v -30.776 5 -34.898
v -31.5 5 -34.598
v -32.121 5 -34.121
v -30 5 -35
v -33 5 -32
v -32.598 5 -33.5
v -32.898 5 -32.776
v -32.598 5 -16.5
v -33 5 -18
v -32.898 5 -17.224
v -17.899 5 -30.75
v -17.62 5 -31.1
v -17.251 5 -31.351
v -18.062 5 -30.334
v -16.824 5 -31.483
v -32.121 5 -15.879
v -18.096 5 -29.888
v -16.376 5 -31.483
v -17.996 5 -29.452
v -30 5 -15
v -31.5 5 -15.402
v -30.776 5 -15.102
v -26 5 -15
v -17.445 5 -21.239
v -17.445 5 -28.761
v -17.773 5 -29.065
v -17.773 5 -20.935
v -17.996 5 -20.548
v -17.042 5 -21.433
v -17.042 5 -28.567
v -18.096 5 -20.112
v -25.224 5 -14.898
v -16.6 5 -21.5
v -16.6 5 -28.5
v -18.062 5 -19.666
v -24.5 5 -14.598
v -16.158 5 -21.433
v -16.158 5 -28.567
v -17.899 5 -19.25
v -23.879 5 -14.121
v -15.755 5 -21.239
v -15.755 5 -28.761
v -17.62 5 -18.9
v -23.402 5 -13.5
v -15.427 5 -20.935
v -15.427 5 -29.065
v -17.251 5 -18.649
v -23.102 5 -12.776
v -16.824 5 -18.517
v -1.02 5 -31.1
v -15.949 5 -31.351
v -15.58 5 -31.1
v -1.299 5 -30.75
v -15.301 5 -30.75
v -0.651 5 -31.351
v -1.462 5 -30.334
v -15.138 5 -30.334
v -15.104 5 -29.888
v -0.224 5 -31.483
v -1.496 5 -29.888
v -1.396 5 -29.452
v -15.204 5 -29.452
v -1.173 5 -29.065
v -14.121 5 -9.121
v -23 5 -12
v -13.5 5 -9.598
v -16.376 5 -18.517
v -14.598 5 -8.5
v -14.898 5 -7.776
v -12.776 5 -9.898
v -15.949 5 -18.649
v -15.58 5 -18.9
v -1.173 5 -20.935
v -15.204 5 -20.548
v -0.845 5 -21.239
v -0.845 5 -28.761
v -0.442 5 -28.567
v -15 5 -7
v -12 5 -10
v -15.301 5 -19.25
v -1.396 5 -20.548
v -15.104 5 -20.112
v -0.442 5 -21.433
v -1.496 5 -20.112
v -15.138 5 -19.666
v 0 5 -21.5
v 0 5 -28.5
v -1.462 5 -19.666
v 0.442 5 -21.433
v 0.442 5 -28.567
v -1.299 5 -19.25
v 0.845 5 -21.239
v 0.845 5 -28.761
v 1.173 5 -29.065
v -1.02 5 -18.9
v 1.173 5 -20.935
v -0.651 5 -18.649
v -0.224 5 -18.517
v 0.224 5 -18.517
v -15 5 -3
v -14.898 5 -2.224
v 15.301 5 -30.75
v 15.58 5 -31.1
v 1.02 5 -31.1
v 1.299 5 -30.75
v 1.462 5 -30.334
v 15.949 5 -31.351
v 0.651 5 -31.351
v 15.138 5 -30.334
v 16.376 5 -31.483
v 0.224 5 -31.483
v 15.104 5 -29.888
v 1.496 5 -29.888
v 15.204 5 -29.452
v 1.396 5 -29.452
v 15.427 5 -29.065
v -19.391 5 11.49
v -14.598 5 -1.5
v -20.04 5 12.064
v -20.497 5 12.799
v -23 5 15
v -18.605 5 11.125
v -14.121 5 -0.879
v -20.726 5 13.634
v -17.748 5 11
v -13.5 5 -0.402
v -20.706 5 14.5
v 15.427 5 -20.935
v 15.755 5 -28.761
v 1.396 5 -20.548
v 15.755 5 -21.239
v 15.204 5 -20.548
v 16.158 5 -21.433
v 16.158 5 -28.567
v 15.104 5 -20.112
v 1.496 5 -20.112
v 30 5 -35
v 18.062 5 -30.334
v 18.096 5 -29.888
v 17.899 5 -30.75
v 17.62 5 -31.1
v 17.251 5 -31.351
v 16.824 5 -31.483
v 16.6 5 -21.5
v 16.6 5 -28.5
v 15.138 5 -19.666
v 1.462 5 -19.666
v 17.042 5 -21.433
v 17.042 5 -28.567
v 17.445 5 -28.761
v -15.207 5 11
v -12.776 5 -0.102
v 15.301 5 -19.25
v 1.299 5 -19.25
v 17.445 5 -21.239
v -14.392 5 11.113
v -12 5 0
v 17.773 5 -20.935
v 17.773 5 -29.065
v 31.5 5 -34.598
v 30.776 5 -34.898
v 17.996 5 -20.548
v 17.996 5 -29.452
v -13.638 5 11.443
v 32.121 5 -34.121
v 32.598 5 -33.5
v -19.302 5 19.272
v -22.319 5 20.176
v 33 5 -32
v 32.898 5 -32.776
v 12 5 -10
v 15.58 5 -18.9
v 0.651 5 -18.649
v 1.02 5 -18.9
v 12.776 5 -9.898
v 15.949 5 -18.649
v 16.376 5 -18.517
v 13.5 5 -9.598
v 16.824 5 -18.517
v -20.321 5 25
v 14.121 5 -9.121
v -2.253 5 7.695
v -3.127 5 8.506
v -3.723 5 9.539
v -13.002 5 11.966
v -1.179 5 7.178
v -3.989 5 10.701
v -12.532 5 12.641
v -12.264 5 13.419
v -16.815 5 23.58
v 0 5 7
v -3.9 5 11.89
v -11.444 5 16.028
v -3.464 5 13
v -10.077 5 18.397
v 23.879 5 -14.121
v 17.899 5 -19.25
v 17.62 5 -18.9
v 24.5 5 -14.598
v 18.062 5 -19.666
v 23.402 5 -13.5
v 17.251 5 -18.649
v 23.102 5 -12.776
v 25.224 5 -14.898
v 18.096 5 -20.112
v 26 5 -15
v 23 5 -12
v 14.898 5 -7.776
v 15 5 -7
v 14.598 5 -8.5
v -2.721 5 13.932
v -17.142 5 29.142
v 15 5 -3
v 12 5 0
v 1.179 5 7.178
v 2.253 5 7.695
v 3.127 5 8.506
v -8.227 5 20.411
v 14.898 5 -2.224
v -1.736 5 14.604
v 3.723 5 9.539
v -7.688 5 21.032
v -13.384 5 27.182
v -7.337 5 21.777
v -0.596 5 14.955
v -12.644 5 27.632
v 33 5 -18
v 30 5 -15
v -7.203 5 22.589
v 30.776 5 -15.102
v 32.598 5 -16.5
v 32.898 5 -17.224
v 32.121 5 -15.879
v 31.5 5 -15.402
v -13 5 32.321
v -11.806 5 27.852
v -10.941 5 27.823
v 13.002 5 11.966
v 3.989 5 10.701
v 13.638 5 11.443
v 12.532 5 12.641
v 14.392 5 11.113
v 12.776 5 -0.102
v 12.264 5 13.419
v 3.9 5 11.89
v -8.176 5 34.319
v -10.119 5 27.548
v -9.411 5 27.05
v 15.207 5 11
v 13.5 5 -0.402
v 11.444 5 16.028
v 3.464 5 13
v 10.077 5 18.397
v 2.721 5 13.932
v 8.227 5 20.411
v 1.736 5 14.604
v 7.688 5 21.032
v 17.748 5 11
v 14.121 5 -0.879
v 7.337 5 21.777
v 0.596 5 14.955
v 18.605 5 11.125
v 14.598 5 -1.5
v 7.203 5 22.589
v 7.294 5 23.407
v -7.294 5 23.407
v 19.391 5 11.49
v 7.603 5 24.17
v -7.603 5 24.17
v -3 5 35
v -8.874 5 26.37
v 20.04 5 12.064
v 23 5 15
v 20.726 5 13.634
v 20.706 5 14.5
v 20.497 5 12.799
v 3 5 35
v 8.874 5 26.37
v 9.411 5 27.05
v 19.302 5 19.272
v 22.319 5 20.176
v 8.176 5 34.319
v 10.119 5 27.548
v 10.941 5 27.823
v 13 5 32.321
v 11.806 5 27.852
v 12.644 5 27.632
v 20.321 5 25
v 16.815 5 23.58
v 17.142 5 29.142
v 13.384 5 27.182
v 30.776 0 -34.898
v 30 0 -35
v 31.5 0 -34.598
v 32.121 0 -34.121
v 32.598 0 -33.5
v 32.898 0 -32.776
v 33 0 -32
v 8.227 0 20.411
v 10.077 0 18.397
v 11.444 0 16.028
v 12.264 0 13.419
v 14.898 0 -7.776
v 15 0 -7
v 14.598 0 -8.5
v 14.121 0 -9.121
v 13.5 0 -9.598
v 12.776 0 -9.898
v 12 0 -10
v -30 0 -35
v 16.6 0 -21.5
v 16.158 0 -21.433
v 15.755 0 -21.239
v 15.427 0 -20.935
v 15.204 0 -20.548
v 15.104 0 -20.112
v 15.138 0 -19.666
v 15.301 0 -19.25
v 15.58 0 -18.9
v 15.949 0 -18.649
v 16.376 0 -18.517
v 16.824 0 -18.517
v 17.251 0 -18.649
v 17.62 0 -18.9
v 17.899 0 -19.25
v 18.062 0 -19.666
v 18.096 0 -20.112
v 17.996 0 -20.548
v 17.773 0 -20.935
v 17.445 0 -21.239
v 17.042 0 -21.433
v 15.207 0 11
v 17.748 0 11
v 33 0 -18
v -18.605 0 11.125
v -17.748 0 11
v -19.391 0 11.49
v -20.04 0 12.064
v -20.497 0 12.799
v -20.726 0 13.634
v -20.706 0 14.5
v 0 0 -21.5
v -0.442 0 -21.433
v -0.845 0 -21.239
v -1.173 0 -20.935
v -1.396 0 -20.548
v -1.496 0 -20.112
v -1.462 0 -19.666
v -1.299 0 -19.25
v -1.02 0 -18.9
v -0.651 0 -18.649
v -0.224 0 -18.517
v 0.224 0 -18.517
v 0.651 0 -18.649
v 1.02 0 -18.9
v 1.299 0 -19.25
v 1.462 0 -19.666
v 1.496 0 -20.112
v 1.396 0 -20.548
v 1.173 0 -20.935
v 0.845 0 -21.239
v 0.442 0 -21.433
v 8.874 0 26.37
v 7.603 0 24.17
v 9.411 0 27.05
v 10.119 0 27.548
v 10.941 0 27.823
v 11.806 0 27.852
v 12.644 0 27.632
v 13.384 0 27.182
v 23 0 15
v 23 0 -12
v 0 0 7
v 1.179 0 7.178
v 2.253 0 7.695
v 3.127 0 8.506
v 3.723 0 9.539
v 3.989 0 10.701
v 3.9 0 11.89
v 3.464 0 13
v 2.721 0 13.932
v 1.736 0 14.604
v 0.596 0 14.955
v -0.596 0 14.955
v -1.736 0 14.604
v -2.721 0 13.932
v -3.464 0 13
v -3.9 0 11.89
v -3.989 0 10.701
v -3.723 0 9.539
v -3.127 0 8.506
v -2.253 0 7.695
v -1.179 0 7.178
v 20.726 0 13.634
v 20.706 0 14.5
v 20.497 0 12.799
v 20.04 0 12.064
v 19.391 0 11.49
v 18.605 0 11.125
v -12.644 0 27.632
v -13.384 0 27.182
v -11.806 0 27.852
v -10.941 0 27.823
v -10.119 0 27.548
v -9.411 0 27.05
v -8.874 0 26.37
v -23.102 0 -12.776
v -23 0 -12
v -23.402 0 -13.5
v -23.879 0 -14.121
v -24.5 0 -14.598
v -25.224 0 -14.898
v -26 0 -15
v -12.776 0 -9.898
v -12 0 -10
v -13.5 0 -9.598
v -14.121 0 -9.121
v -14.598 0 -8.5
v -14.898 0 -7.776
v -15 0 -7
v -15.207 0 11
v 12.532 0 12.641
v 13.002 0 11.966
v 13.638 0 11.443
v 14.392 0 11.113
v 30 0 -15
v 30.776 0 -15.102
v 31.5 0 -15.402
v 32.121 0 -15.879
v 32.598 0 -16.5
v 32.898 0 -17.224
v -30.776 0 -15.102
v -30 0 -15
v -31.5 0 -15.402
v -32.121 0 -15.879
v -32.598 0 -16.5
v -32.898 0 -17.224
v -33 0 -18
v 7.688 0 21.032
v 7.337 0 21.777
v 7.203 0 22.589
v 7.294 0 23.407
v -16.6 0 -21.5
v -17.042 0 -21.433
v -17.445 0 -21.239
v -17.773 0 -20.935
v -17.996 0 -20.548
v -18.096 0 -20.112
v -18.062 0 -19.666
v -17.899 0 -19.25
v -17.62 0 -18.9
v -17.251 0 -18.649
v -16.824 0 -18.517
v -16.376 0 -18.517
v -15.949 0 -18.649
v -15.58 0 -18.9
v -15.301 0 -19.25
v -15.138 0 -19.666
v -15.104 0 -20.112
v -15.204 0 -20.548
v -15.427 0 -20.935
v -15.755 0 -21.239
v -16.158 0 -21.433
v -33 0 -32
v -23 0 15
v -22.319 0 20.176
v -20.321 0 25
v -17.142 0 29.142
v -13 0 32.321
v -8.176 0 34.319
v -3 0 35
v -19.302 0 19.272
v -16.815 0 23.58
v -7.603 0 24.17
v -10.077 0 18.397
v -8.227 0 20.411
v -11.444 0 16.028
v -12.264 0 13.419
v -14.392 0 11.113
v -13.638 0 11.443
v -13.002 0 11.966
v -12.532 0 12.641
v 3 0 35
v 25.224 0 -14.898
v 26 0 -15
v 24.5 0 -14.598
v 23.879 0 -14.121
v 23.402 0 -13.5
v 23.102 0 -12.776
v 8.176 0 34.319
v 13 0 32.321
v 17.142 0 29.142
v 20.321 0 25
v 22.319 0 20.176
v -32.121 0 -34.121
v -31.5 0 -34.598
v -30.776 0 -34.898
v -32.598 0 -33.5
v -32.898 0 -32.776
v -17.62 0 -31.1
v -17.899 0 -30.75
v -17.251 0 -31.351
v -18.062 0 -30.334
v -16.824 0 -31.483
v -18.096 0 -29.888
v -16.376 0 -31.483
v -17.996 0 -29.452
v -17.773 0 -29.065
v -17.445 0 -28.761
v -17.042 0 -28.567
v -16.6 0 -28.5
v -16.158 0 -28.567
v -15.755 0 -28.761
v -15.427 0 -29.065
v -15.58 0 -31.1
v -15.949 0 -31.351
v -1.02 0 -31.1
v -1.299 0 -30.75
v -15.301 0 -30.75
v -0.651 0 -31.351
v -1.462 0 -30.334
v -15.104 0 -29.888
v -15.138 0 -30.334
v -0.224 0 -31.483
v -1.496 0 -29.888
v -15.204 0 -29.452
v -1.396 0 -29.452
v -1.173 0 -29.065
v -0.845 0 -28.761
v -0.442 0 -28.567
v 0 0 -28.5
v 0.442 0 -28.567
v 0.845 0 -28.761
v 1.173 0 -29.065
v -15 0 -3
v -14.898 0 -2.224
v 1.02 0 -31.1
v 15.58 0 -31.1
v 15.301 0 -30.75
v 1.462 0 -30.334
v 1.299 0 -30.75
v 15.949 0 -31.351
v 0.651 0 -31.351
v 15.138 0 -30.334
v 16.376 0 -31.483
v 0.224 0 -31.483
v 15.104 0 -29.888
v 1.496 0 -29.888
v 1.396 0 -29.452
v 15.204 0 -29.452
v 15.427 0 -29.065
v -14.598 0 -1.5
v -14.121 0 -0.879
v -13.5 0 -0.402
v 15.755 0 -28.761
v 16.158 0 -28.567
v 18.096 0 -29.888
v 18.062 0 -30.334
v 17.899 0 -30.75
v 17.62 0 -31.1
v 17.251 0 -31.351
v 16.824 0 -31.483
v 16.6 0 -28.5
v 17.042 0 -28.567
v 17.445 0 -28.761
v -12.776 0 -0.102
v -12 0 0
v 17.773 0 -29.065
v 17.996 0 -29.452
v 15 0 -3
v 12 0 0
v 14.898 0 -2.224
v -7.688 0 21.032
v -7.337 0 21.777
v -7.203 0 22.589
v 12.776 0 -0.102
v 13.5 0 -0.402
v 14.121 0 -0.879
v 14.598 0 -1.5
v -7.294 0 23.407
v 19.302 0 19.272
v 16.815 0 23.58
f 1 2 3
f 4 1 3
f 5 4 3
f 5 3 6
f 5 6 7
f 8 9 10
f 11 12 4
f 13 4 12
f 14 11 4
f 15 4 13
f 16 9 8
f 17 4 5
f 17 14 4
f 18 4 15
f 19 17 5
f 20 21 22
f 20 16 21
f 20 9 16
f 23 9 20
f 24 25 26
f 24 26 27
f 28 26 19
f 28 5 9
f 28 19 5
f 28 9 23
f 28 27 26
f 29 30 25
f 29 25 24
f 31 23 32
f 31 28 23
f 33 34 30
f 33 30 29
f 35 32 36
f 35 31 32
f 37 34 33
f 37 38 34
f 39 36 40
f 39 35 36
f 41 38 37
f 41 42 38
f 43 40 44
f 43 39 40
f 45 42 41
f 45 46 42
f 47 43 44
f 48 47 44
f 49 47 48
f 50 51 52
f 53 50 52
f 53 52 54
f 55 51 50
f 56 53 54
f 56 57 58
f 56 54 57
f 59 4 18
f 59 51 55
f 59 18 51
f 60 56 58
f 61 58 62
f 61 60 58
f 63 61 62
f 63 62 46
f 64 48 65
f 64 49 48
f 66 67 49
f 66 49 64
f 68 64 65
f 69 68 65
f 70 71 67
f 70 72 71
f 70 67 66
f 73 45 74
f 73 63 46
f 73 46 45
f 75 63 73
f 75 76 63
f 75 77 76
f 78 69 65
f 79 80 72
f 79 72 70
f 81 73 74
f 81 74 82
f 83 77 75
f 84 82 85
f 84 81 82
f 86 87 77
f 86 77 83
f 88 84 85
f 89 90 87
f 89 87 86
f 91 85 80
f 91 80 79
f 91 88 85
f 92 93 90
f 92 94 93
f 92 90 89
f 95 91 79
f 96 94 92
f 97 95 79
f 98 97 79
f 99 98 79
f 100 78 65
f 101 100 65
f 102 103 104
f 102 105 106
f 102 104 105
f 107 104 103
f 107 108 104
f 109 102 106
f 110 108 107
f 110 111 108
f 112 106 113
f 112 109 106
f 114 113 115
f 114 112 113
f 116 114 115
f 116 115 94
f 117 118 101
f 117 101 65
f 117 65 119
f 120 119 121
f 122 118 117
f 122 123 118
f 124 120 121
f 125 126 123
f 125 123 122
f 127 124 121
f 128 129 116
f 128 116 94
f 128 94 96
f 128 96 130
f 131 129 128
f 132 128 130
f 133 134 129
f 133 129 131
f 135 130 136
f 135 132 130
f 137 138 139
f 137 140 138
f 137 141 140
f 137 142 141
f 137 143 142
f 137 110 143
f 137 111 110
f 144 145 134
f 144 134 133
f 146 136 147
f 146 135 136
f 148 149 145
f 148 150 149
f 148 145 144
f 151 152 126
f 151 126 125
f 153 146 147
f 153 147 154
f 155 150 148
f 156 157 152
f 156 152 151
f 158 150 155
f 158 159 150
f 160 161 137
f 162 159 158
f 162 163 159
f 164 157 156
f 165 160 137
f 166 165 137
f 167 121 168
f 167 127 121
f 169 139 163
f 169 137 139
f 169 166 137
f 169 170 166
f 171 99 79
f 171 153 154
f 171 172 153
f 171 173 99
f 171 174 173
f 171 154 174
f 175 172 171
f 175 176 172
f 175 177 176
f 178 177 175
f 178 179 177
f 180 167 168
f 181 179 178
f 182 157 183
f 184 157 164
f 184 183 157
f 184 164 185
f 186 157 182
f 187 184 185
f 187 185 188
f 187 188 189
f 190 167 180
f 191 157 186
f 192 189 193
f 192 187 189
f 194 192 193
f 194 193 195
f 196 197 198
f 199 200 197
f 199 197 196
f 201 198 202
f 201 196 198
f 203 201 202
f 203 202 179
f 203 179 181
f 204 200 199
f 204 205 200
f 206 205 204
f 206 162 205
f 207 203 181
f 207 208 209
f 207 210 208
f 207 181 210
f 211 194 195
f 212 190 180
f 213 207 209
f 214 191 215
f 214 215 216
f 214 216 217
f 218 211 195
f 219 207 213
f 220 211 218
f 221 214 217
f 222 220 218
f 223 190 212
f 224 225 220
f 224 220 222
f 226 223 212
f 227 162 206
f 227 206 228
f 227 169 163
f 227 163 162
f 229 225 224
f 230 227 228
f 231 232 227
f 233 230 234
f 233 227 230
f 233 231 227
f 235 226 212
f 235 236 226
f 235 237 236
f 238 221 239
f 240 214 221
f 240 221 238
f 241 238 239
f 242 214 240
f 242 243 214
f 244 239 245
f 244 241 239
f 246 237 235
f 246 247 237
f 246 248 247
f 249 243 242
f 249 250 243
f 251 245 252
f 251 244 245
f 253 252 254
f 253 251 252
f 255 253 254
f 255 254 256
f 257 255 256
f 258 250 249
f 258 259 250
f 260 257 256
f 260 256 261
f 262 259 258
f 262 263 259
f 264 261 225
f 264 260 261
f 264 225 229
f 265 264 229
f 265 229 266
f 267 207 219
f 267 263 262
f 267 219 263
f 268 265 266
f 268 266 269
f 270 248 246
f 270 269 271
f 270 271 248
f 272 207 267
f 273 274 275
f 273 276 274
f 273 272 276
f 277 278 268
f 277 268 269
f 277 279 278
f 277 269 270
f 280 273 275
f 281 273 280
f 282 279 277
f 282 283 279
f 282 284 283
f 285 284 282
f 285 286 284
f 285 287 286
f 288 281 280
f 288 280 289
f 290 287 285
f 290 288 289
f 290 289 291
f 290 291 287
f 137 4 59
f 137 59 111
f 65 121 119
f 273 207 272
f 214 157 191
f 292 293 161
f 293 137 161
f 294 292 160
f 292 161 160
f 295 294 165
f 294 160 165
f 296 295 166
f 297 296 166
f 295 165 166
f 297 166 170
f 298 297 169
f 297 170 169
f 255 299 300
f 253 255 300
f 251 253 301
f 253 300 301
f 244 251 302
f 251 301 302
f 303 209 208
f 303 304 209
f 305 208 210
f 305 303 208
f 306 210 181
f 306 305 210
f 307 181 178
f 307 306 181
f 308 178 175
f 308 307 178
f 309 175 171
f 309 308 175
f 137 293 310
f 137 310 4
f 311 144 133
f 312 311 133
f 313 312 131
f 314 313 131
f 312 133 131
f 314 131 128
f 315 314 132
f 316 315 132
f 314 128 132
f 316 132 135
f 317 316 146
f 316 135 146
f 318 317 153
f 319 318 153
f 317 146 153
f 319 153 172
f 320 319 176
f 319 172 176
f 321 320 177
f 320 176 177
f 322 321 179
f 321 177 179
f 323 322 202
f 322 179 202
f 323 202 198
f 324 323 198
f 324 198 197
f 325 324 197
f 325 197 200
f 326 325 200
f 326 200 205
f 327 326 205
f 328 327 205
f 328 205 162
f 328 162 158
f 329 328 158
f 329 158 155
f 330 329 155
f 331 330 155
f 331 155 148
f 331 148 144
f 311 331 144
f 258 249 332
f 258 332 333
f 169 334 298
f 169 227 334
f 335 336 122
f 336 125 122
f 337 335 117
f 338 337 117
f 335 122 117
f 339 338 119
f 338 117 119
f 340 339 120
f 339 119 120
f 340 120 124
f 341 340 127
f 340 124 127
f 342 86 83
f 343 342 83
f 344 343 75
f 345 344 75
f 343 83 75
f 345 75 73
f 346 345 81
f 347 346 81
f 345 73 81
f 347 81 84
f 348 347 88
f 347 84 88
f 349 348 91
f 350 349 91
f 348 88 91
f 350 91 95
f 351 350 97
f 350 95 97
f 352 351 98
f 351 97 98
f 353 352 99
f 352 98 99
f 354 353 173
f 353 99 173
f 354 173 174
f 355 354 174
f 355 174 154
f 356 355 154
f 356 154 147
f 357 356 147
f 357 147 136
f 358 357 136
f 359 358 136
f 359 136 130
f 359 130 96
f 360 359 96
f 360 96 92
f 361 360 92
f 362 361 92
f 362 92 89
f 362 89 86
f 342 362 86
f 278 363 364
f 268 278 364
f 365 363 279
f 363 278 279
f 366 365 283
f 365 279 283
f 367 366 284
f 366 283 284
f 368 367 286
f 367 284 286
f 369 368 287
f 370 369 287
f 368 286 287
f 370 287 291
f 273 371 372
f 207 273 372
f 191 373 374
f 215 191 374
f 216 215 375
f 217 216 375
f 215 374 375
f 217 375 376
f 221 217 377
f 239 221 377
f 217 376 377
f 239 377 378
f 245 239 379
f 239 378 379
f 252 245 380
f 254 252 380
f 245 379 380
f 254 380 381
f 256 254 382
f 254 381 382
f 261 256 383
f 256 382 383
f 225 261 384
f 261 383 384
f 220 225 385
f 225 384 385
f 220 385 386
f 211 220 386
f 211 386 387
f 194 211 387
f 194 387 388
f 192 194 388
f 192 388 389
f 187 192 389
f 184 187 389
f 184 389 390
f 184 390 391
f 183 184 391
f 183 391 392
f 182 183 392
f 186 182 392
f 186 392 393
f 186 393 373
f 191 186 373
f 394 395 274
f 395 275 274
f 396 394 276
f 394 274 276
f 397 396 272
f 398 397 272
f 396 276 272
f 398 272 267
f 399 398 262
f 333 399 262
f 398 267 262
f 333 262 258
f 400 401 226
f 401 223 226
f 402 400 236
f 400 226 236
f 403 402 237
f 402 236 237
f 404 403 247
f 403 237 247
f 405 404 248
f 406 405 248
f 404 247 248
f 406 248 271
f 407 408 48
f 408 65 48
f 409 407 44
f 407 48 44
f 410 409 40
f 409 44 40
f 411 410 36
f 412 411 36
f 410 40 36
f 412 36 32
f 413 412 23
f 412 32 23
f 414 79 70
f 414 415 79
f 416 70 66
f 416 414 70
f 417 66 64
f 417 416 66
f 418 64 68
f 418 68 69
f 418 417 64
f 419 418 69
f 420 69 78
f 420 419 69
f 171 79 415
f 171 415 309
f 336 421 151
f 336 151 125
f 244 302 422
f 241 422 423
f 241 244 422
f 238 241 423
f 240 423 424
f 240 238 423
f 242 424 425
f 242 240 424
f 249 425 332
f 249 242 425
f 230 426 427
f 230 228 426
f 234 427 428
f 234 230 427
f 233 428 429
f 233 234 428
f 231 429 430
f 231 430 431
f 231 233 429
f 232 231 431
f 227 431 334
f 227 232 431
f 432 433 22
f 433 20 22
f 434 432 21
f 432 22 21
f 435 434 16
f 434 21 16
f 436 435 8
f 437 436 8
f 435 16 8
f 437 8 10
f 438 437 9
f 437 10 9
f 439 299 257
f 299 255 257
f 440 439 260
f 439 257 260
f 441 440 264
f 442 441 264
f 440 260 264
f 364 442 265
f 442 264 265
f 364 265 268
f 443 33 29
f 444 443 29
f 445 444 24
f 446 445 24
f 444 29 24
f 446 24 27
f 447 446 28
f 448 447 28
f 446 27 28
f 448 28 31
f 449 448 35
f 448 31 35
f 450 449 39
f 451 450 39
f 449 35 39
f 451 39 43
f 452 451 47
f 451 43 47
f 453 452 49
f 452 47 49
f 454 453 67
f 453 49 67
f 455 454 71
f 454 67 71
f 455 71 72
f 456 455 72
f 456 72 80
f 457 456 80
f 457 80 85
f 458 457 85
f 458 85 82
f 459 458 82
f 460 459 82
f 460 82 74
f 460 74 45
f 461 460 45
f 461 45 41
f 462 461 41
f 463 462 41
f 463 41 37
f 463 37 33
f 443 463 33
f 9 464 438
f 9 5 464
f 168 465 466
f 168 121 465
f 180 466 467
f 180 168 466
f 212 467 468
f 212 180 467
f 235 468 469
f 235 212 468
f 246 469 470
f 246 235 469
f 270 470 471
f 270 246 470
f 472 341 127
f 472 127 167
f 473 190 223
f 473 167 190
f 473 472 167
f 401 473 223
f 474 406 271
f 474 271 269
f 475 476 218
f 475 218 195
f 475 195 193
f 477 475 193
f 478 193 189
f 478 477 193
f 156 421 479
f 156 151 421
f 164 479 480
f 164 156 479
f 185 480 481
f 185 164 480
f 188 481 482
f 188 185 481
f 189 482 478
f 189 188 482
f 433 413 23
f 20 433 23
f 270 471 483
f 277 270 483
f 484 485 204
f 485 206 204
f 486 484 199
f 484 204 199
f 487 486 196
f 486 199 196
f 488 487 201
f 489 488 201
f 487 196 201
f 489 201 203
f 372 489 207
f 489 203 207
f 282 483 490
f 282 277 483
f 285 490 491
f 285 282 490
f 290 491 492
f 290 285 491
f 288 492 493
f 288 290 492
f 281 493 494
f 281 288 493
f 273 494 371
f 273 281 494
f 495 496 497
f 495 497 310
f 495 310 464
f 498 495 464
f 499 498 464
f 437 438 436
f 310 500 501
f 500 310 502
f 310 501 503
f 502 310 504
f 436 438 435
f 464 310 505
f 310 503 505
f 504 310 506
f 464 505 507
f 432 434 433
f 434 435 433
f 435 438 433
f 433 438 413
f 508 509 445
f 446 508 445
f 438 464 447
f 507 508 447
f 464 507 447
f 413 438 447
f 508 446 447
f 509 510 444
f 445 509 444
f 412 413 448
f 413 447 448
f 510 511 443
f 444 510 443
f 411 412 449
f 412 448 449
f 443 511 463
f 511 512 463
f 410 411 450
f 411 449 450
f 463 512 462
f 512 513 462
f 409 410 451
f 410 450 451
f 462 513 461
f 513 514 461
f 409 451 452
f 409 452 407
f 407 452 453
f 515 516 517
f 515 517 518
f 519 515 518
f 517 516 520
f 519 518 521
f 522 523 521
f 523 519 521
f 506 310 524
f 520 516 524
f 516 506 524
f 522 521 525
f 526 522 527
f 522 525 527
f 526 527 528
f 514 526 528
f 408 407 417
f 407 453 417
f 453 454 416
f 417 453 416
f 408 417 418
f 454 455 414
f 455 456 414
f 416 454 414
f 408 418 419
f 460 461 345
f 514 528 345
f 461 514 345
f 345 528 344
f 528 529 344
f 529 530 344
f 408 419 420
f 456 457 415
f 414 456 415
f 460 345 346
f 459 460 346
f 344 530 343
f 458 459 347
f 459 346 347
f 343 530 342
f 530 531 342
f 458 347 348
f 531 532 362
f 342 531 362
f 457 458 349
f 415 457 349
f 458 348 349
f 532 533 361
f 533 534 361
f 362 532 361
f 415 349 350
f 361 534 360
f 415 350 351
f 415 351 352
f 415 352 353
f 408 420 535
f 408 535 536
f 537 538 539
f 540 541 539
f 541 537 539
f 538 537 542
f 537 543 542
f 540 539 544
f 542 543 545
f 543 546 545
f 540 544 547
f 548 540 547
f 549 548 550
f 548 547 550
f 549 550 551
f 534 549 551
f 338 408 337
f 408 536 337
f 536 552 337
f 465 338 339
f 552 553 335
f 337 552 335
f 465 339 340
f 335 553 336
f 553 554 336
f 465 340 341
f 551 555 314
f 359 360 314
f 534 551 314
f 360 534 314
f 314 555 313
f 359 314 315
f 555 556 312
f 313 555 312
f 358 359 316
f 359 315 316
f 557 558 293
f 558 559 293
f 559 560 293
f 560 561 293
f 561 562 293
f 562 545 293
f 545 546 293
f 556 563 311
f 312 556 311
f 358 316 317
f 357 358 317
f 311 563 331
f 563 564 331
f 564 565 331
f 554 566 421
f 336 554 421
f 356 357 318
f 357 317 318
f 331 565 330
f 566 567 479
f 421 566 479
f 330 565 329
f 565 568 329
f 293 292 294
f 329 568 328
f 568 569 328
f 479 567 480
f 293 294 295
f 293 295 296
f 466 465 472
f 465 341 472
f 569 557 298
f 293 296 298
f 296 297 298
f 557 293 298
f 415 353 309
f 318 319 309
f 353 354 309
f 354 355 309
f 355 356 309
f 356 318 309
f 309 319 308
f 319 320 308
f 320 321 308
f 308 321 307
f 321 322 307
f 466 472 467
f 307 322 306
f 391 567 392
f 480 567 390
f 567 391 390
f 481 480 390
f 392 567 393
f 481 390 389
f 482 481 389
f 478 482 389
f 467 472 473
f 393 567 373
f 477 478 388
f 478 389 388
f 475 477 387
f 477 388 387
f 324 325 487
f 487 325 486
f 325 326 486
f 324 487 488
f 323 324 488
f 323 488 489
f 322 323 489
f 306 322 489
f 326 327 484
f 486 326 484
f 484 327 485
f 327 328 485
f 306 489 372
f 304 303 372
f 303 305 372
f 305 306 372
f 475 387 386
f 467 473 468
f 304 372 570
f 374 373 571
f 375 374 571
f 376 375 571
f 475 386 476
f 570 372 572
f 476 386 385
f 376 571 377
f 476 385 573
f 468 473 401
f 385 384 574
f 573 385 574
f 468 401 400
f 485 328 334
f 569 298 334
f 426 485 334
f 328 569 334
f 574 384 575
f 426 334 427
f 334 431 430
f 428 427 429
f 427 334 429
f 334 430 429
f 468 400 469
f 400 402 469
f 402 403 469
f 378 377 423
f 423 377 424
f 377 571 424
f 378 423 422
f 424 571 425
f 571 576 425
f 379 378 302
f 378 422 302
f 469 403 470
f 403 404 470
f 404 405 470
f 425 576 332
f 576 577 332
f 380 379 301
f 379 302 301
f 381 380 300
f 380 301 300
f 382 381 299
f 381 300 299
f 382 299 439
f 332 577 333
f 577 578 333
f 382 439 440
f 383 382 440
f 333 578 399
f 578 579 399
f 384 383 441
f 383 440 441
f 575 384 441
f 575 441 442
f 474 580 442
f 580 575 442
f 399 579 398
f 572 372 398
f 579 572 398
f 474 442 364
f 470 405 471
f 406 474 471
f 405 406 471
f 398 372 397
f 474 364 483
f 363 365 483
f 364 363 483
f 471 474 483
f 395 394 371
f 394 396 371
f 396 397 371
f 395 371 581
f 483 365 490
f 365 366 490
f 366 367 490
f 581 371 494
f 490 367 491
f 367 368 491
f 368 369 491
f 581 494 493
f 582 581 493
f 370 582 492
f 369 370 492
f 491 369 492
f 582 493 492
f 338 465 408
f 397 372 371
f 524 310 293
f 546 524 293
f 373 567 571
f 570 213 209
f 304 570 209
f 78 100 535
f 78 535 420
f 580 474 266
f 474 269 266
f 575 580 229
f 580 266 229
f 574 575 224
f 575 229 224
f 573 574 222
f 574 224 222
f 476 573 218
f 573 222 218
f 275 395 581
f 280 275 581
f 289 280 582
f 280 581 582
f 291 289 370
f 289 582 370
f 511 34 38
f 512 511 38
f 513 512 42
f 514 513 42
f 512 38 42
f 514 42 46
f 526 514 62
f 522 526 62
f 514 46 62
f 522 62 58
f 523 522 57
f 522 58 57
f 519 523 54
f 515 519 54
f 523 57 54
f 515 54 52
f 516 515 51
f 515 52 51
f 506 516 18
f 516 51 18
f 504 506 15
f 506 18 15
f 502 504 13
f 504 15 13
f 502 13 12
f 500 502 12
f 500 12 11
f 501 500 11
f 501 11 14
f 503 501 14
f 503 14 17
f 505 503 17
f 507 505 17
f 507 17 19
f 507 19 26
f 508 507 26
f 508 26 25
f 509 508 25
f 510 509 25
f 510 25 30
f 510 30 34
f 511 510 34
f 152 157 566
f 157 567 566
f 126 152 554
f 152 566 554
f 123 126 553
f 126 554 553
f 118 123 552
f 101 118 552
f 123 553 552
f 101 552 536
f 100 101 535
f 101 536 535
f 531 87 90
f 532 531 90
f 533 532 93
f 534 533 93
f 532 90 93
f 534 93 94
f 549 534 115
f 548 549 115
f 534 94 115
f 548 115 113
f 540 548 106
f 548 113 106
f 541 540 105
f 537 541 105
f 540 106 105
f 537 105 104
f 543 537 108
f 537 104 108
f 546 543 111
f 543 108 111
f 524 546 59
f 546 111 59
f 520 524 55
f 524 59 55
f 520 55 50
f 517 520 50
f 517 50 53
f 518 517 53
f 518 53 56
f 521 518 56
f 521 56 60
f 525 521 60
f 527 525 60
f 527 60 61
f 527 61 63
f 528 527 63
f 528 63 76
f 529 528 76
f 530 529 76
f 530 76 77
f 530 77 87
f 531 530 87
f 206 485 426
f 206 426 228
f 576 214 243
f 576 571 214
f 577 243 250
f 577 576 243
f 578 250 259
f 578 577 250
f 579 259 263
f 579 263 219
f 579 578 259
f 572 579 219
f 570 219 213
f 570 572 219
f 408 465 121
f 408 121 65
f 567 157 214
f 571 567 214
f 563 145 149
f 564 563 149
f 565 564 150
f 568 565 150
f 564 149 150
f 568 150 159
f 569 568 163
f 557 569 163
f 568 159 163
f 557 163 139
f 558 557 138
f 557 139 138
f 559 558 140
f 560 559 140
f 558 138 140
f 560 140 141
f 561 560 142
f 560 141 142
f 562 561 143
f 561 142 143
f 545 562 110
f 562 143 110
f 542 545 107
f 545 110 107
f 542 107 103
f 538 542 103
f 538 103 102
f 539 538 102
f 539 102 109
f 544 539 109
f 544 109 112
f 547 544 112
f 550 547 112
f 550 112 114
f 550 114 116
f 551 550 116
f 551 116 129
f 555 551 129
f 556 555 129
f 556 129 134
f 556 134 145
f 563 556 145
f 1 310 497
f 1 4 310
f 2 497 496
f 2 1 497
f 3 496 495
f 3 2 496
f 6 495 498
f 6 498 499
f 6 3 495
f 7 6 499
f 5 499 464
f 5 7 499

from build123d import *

# Parameters (mm, degrees)
SKETCH_1_W          = 46
SKETCH_1_H          = 70
EXTRUDE_1_DEPTH     = 5
SKETCH_2_R          = 4
CUT_EXTRUDE_1_DEPTH = 43.178193418
FILLET_1_R          = 20
CUT_EXTRUDE_4_DEPTH = 43.178193418
FILLET_3_R          = 3
SKETCH_8_W          = 20
SKETCH_8_H          = 5
EXTRUDE_2_DEPTH     = 10
SKETCH_9_W          = 20
SKETCH_9_H          = 5
EXTRUDE_3_DEPTH     = 10
FILLET_6_R          = 3
SKETCH_10_R         = 1.5
CUT_EXTRUDE_5_DEPTH = 49.363209157
SKETCH_11_W         = 30
SKETCH_11_H         = 10
CUT_EXTRUDE_6_DEPTH = 49.363209157
FILLET_7_R          = 3


with BuildPart() as part:
    # 草图1 → 凸台-拉伸1 (new body)
    with BuildSketch(Plane(origin=(0, 0, 0), x_dir=(1, 0, 0), z_dir=(0, 1, 0))):
        Rectangle(SKETCH_1_W, SKETCH_1_H)
    extrude(amount=EXTRUDE_1_DEPTH)

    # 草图2 → 切除-拉伸1 (cut, through all)
    with BuildSketch(Plane.XZ):
        with Locations(Location((0, 11, 0), (0, 0, 270))):
            Circle(SKETCH_2_R)
    extrude(amount=-CUT_EXTRUDE_1_DEPTH, mode=Mode.SUBTRACT)

    # 圆角1
    fillet_1_edges = [part.edges().sort_by_distance(p)[0] for p in [
        (23, 2.5, 35),
        (-23, 2.5, 35),
    ]]
    fillet(fillet_1_edges, radius=FILLET_1_R)

    # 草图6 → 切除-拉伸4 (cut, through all)
    with BuildSketch(Plane.XZ):
        with BuildLine():
            Line((12.5, 11), (21, 11))
            ThreePointArc((21, 11), (18.186533479, 21.5), (10.5, 29.186533479))
            Line((10.5, 29.186533479), (6.25, 21.825317547))
            ThreePointArc((6.25, 21.825317547), (10.825317547, 17.25), (12.5, 11))
        make_face()
        with BuildLine():
            Line((-12.5, 11), (-21, 11))
            ThreePointArc((-21, 11), (-18.186533479, 21.5), (-10.5, 29.186533479))
            Line((-10.5, 29.186533479), (-6.25, 21.825317547))
            ThreePointArc((-6.25, 21.825317547), (-10.825317547, 17.25), (-12.5, 11))
        make_face()
    extrude(amount=-CUT_EXTRUDE_4_DEPTH, mode=Mode.SUBTRACT)

    # 圆角3
    fillet_3_edges = [part.edges().sort_by_distance(p)[0] for p in [
        (-6.25, 2.5, 21.825317547),
        (-12.5, 2.5, 11),
        (-21, 2.5, 11),
        (-10.5, 2.5, 29.186533479),
        (12.5, 2.5, 11),
        (6.25, 2.5, 21.825317547),
        (10.5, 2.5, 29.186533479),
        (21, 2.5, 11),
    ]]
    fillet(fillet_3_edges, radius=FILLET_3_R)

    # 草图8 → 凸台-拉伸2 (add)
    with BuildSketch(Plane(origin=(23, 0, 0), x_dir=(0, 0, -1), z_dir=(1, 0, 0))):
        with Locations((25, 2.5)):
            Rectangle(SKETCH_8_W, SKETCH_8_H)
    extrude(amount=EXTRUDE_2_DEPTH)

    # 草图9 → 凸台-拉伸3 (add)
    with BuildSketch(Plane.ZY.offset(23)):
        with Locations((-25, 2.5)):
            Rectangle(SKETCH_9_W, SKETCH_9_H)
    extrude(amount=EXTRUDE_3_DEPTH)

    # 圆角6
    fillet_6_edges = [part.edges().sort_by_distance(p)[0] for p in [
        (23, 2.5, -15),
        (33, 2.5, -35),
        (33, 2.5, -15),
        (-23, 2.5, -15),
        (-33, 2.5, -35),
        (-33, 2.5, -15),
    ]]
    fillet(fillet_6_edges, radius=FILLET_6_R)

    # 草图10 → 切除-拉伸5 (cut, through all)
    with BuildSketch(Plane(origin=(0, 5, 0), x_dir=(1, 0, 0), z_dir=(0, 1, 0))):
        with Locations(Location((-16.6, 30, 0), (0, 0, 270))):
            Circle(SKETCH_10_R)
        with Locations(Location((0, 30, 0), (0, 0, 270))):
            Circle(SKETCH_10_R)
        with Locations(Location((16.6, 30, 0), (0, 0, 270))):
            Circle(SKETCH_10_R)
        with Locations(Location((16.6, 20, 0), (0, 0, 90))):
            Circle(SKETCH_10_R)
        with Locations(Location((0, 20, 0), (0, 0, 90))):
            Circle(SKETCH_10_R)
        with Locations(Location((-16.6, 20, 0), (0, 0, 90))):
            Circle(SKETCH_10_R)
    extrude(amount=-CUT_EXTRUDE_5_DEPTH, mode=Mode.SUBTRACT)

    # 草图11 → 切除-拉伸6 (cut, through all)
    with BuildSketch(Plane(origin=(0, 5, 0), x_dir=(1, 0, 0), z_dir=(0, 1, 0))):
        with Locations((0, 5)):
            Rectangle(SKETCH_11_W, SKETCH_11_H)
    extrude(amount=-CUT_EXTRUDE_6_DEPTH, mode=Mode.SUBTRACT)

    # 圆角7
    fillet_7_edges = [part.edges().sort_by_distance(p)[0] for p in [
        (15, 2.5, -10),
        (15, 2.5, 0),
        (-15, 2.5, 0),
        (-15, 2.5, -10),
    ]]
    fillet(fillet_7_edges, radius=FILLET_7_R)


solid = part.part
